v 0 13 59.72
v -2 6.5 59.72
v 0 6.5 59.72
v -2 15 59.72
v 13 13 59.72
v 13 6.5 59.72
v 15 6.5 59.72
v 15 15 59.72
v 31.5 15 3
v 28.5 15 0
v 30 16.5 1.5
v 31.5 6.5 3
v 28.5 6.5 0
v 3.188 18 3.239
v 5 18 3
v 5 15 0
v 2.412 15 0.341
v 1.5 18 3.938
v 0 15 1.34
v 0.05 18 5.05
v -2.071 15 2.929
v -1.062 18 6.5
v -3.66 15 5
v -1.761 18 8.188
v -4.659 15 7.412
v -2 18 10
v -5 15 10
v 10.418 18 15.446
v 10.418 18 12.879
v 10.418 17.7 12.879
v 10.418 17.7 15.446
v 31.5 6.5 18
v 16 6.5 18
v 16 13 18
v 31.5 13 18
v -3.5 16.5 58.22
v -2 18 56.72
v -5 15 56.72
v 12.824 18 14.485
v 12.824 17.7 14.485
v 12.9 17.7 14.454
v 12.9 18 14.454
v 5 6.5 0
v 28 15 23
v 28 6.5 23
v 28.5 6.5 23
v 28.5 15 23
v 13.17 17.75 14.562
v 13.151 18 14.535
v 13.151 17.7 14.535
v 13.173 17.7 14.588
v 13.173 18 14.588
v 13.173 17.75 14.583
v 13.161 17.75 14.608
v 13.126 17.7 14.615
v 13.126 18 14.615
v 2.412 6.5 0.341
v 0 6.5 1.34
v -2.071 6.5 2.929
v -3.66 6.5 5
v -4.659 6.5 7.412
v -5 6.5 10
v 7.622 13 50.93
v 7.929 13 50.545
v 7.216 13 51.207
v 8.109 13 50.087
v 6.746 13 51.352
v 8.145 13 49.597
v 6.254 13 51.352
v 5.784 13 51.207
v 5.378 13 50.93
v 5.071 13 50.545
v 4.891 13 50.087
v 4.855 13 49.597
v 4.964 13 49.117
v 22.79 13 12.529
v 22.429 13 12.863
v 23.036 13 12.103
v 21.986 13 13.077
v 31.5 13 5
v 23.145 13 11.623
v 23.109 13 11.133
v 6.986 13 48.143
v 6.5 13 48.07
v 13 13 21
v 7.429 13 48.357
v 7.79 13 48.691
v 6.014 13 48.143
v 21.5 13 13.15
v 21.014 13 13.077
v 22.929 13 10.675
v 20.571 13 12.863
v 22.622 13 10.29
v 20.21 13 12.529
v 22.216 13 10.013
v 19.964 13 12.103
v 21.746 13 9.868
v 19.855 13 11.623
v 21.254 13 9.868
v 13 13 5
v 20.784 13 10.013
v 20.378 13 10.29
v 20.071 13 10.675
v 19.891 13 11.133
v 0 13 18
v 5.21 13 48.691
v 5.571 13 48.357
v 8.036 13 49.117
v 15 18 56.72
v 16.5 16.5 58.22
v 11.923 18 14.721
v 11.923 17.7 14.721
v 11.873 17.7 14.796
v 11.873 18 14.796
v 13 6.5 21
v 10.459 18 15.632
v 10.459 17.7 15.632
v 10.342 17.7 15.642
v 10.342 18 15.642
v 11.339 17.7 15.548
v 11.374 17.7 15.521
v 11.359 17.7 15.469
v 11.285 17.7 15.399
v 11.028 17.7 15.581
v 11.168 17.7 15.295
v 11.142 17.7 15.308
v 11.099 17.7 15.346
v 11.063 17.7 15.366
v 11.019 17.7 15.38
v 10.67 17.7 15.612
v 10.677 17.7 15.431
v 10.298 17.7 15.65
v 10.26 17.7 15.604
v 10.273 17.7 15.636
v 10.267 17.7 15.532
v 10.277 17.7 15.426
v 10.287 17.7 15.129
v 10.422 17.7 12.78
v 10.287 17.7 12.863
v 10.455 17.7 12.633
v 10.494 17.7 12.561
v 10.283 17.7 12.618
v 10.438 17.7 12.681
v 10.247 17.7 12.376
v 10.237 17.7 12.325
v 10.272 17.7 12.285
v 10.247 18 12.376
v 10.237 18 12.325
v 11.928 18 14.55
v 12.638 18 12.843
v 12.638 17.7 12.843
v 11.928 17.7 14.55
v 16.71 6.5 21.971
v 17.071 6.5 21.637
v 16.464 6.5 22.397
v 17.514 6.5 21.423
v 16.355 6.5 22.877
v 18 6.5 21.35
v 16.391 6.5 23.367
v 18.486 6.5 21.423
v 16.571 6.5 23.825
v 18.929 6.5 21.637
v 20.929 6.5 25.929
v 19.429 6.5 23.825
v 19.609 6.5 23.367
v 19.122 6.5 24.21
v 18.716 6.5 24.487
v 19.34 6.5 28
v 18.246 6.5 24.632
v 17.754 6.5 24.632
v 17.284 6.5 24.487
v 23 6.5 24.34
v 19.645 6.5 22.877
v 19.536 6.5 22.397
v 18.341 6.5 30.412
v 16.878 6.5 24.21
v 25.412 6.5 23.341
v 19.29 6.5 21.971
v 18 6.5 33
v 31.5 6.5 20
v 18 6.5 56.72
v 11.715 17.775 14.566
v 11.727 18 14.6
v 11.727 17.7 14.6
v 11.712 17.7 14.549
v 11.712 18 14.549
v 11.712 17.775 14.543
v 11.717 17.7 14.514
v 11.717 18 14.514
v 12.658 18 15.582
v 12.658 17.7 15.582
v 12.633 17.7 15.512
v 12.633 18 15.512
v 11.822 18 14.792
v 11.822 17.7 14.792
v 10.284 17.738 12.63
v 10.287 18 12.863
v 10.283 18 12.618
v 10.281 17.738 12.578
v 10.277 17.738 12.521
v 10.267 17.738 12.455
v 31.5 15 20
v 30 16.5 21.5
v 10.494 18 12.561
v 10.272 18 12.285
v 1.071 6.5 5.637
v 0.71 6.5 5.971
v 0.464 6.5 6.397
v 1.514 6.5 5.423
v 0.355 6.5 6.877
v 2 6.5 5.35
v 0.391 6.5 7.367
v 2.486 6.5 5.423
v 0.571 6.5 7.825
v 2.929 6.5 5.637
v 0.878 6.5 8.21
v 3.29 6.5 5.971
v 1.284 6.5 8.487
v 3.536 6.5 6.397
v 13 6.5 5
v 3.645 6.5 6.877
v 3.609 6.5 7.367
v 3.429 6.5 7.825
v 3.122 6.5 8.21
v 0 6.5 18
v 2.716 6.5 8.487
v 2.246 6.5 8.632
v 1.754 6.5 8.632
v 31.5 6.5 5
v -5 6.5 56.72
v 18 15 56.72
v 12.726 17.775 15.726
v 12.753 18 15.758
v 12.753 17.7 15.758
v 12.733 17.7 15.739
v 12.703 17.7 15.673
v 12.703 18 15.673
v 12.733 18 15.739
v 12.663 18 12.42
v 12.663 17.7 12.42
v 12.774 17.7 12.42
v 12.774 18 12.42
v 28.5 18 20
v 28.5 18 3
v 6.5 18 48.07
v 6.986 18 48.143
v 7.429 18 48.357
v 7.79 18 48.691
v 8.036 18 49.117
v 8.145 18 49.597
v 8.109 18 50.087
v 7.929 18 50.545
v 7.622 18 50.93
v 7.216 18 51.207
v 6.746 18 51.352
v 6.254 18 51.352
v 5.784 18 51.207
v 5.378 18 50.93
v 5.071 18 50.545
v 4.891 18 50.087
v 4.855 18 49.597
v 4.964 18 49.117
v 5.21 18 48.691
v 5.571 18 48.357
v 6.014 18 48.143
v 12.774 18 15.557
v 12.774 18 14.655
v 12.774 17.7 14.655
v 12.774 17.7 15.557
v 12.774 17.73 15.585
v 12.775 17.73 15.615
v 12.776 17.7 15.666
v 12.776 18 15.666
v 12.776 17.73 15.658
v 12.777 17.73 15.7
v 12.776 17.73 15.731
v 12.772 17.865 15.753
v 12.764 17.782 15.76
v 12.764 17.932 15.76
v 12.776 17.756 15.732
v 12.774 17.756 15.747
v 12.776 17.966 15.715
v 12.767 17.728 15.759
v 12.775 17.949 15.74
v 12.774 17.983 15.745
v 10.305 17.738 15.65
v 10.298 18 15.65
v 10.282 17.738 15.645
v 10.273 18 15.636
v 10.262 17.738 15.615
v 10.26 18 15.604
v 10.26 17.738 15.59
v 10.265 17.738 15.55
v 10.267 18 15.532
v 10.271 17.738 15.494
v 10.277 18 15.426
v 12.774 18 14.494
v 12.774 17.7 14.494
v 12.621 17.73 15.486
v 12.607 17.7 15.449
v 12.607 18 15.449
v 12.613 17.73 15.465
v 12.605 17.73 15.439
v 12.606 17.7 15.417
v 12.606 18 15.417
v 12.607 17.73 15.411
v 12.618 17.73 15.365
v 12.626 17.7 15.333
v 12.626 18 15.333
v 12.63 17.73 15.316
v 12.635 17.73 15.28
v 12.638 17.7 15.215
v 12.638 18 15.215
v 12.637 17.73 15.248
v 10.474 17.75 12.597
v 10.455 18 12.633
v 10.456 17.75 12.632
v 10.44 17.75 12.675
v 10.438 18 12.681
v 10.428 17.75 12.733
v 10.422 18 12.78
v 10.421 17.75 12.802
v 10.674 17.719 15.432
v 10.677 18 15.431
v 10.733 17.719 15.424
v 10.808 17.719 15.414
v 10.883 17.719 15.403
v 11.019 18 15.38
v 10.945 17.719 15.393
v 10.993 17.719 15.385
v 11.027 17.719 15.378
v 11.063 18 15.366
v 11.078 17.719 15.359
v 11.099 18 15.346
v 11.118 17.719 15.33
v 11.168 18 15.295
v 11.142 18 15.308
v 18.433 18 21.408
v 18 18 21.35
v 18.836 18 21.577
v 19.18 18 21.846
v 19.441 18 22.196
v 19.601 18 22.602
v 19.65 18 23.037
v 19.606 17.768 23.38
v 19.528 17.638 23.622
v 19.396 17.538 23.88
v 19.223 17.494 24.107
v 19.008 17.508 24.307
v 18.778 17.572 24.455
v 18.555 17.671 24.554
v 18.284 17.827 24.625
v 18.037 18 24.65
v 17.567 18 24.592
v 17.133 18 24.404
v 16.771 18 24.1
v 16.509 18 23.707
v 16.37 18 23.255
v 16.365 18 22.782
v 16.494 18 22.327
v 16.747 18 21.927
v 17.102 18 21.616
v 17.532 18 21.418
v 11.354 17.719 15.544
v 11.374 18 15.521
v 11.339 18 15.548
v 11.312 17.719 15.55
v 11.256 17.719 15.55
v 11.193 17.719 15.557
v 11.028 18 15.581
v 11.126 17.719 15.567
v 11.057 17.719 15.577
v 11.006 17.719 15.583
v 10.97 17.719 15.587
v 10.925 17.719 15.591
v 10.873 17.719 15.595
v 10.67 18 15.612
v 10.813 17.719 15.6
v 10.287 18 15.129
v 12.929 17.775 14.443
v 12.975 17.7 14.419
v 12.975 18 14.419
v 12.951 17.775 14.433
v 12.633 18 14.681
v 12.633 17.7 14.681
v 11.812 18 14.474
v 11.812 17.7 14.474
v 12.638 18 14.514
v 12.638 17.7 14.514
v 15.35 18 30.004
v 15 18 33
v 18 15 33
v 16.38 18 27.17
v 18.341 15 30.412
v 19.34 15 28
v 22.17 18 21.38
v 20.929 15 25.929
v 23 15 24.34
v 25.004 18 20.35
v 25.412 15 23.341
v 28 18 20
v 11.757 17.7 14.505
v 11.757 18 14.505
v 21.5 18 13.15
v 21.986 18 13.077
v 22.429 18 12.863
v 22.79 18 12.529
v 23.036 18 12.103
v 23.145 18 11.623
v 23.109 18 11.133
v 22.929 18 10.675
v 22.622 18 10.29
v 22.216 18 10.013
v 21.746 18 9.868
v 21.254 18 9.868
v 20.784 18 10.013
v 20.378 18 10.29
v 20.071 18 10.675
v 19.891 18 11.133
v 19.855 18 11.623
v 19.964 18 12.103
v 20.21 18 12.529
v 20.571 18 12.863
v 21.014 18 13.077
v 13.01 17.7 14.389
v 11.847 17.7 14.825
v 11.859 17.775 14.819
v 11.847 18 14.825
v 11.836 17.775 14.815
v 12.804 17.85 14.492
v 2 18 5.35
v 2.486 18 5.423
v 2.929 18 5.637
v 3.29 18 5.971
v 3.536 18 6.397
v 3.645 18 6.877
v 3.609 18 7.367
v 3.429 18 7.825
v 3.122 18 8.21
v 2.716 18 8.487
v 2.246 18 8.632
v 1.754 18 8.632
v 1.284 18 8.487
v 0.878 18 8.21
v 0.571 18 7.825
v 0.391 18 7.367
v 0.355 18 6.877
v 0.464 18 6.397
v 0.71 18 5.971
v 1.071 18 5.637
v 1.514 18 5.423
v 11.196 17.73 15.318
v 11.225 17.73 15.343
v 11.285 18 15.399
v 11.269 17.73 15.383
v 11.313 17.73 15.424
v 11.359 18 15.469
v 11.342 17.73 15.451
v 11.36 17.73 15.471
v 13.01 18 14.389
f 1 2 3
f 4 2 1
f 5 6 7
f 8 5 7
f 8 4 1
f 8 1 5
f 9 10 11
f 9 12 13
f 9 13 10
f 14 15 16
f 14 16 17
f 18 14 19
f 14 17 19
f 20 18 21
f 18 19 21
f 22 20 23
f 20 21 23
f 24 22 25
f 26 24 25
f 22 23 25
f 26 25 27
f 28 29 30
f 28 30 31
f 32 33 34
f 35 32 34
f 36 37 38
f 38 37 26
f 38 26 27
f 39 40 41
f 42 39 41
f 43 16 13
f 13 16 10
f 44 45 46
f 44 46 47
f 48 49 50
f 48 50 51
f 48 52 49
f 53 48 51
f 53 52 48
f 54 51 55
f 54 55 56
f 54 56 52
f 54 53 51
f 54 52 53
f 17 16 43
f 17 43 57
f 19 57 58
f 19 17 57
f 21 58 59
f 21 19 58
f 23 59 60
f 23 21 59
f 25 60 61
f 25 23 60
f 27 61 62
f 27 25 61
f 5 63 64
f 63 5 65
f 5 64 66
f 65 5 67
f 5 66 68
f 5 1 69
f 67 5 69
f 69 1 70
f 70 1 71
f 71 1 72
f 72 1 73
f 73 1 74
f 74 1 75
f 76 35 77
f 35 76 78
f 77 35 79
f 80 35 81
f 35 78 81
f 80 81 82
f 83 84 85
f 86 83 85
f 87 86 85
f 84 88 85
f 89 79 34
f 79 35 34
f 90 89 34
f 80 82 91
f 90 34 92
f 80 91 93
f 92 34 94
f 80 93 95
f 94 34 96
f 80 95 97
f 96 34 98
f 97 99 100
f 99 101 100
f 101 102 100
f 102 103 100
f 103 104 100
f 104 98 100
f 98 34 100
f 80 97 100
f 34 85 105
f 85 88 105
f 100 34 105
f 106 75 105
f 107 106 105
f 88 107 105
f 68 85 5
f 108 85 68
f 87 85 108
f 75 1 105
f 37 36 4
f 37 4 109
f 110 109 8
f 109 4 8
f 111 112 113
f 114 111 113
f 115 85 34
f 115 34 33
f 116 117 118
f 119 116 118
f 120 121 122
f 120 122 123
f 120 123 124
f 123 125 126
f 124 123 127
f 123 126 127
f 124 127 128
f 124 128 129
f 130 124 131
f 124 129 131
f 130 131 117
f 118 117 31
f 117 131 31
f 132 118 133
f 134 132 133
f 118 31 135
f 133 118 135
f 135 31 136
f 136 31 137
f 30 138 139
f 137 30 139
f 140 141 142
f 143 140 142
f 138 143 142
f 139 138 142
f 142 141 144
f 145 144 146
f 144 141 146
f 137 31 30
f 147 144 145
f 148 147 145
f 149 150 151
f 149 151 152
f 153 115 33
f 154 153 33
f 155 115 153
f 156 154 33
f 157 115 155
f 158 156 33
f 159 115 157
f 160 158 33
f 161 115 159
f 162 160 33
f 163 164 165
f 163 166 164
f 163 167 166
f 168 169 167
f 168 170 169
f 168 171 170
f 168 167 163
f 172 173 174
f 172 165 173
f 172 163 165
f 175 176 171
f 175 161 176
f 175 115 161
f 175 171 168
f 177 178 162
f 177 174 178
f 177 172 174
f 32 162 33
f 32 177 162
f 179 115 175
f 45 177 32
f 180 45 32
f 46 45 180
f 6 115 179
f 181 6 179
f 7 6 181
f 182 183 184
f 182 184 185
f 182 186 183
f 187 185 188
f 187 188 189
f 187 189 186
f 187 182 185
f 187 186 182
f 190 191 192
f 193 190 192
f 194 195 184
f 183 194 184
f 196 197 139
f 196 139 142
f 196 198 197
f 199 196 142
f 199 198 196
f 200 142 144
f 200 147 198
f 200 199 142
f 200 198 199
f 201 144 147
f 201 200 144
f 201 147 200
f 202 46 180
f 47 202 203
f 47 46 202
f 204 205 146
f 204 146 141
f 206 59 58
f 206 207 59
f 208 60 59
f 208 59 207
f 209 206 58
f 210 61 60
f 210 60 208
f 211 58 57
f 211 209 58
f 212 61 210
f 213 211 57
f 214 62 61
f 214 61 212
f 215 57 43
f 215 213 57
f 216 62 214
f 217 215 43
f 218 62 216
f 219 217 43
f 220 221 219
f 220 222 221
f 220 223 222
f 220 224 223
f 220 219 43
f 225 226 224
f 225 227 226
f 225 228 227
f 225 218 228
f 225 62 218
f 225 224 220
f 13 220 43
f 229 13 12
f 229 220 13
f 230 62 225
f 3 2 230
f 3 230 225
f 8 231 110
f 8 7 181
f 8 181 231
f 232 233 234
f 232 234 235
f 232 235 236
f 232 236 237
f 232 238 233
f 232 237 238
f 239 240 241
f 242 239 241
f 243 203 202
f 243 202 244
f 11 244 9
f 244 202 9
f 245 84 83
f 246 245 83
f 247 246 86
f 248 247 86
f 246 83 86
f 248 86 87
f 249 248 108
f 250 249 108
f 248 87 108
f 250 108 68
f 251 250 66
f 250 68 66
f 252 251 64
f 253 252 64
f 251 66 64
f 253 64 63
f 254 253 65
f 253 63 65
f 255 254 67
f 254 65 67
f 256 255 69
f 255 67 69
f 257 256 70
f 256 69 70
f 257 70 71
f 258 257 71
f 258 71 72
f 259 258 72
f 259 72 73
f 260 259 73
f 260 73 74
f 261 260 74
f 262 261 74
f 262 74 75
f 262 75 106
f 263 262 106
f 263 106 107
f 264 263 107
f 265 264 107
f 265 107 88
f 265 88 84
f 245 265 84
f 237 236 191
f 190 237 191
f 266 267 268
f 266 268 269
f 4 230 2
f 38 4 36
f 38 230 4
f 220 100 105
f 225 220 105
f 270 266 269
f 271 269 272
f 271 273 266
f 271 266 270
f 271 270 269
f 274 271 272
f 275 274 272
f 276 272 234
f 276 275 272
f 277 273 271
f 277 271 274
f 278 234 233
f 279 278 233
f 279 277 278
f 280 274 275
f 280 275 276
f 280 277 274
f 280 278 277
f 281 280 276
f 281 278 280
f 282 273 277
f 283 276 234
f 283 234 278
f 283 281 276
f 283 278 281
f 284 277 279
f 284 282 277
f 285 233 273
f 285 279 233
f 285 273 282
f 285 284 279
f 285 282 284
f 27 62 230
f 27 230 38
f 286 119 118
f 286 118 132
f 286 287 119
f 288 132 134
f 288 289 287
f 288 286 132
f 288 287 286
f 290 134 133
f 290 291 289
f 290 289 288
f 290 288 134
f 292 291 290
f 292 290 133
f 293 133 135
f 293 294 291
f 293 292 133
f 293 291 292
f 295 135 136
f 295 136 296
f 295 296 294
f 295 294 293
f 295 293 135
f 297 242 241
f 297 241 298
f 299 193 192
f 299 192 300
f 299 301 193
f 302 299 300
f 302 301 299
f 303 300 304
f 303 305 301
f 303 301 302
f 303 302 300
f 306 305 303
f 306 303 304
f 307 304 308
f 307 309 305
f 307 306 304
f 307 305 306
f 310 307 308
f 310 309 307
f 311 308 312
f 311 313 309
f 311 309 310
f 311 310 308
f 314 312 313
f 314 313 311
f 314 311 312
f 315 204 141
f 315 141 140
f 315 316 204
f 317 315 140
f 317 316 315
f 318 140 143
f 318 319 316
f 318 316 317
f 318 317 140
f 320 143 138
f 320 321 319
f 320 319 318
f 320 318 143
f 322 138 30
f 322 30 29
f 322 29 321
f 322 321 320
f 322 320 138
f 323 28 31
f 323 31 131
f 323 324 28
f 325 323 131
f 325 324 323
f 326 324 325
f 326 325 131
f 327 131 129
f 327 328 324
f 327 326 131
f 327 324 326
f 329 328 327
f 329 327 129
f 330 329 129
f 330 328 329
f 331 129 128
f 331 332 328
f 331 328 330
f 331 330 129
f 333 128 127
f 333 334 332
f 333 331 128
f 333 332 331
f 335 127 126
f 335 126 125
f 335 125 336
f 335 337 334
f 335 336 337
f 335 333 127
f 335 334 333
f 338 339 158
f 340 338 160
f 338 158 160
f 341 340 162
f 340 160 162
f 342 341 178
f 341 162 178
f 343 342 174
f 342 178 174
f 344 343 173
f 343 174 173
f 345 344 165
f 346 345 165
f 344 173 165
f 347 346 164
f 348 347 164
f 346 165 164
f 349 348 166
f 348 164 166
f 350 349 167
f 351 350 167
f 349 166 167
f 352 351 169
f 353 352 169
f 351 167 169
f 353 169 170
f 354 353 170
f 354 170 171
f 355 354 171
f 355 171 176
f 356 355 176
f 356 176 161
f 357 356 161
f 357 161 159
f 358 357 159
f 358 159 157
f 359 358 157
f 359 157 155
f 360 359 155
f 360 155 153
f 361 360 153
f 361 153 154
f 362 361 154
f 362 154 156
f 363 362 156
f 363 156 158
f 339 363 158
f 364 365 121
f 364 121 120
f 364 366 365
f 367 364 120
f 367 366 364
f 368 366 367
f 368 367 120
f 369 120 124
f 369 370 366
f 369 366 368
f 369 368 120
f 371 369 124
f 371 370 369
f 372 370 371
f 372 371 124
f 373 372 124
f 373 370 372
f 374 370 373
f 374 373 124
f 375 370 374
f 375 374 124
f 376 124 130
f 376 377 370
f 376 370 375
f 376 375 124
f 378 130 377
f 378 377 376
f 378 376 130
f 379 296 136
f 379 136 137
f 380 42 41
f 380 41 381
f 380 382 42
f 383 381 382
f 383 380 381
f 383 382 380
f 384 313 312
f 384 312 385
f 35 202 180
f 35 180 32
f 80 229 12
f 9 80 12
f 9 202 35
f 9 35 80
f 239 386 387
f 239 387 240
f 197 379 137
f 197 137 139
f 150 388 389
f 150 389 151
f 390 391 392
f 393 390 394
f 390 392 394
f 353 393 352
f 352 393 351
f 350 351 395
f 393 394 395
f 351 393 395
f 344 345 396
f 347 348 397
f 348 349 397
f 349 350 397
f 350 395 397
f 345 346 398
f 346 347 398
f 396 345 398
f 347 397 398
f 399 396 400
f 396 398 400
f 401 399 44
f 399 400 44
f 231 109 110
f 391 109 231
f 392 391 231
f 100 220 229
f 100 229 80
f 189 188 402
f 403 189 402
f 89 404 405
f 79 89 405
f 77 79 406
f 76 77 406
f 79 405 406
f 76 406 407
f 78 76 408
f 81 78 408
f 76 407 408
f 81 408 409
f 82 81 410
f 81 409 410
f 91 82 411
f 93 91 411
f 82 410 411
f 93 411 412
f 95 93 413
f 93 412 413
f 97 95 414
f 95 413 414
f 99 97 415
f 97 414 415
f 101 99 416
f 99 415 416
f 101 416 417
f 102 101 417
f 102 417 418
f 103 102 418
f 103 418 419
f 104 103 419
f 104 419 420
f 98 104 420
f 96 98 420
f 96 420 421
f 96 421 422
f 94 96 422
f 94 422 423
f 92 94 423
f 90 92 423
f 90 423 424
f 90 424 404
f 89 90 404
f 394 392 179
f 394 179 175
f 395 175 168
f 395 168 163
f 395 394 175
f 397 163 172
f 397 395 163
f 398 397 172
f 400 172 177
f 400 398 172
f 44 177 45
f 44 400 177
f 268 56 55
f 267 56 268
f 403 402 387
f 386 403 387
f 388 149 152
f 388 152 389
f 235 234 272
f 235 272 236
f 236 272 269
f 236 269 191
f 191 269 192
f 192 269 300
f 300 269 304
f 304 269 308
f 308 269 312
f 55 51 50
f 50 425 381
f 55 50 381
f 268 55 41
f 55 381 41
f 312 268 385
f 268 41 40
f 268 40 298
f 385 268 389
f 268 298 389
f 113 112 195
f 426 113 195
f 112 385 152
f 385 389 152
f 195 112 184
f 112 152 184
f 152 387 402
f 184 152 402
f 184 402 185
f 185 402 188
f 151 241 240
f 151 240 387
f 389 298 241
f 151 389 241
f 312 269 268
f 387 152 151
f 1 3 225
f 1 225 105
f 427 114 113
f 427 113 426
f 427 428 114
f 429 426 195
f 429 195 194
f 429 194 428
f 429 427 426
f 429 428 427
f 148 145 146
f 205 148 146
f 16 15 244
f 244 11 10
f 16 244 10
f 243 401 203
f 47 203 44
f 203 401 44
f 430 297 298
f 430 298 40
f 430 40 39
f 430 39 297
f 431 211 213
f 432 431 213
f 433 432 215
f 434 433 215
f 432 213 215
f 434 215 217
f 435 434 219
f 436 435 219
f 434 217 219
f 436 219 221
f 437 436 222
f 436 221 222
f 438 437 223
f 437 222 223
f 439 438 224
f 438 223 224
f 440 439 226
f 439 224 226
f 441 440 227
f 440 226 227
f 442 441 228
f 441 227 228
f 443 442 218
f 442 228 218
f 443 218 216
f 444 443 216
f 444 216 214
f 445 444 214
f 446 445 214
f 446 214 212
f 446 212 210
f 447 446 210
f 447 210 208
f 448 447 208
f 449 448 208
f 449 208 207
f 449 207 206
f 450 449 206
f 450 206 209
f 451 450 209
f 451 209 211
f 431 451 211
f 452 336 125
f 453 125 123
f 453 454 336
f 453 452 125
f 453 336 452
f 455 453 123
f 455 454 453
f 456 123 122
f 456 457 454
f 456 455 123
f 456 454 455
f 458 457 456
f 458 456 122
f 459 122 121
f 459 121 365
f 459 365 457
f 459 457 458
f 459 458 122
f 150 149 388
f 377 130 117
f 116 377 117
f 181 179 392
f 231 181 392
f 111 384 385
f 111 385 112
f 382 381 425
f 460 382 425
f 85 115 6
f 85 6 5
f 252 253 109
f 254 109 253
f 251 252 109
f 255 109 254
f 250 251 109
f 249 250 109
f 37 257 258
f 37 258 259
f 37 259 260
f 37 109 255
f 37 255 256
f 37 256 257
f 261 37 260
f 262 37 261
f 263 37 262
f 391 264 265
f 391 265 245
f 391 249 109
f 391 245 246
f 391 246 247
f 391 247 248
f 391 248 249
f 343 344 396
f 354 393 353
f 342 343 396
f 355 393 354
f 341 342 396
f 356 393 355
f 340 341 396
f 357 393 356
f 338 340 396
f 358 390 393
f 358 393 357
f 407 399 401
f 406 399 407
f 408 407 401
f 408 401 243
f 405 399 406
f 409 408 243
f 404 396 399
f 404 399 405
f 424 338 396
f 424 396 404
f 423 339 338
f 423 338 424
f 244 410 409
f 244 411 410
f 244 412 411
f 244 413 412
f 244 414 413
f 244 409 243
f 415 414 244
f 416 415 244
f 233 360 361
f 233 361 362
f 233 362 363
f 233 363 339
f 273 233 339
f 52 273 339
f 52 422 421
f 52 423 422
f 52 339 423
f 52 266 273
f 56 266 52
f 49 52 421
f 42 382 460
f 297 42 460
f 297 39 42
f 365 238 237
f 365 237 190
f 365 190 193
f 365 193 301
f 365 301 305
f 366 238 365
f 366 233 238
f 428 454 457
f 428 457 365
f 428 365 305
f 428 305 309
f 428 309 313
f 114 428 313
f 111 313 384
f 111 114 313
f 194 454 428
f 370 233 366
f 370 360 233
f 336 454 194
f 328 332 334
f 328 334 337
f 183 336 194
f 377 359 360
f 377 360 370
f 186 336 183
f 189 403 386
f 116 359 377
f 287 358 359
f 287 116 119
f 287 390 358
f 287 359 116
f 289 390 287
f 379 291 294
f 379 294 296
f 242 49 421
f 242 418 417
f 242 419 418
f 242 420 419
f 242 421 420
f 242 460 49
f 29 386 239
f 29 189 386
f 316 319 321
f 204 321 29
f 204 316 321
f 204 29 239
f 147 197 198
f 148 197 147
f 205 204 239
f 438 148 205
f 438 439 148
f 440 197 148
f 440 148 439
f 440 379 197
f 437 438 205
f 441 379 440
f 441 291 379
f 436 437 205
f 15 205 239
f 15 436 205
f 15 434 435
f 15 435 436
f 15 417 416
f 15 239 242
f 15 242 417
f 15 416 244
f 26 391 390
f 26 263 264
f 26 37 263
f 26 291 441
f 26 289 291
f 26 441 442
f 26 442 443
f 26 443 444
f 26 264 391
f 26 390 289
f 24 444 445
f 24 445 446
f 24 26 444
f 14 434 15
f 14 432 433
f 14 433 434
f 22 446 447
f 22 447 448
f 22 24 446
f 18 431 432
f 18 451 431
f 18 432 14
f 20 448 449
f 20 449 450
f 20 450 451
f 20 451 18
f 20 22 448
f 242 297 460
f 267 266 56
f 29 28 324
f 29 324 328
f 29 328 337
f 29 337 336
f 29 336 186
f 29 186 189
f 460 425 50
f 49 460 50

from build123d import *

# Parameters (mm, degrees)
SKETCH_1_W          = 23
SKETCH_1_H          = 23
SKETCH_1_W_2        = 13
SKETCH_1_H_2        = 13
EXTRUDE_1_DEPTH     = 59.72
SKETCH_2_R          = 1.65
CUT_EXTRUDE_1_DEPTH = 34
SKETCH_4_W          = 23
SKETCH_4_H          = 23
SKETCH_4_R          = 3
EXTRUDE_2_DEPTH     = 3.5
SKETCH_5_W          = 23
SKETCH_5_H          = 23
SKETCH_5_W_2        = 13
SKETCH_5_H_2        = 13
EXTRUDE_1_2_DEPTH   = 10
SKETCH_6_R          = 1.65
CUT_EXTRUDE_2_DEPTH = 39
SKETCH_7_W          = 13
SKETCH_7_H          = 13
CUT_EXTRUDE_3_DEPTH = 13
CHAMFER_1_SIZE      = 3
SKETCH_8_W          = 36.5
SKETCH_8_H          = 59.72
CUT_EXTRUDE_4_DEPTH = 11.5
EXTRUDE_3_DEPTH     = 6.5
FILLET_1_R          = 10
FILLET_2_R          = 10
SKETCH_10_R         = 1.65
CUT_EXTRUDE_5_DEPTH = 28.5
CHAMFER_3_SIZE      = 3
CHAMFER_4_SIZE      = 3
CHAMFER_5_SIZE      = 3
CUT_EXTRUDE_6_DEPTH = 0.3


with BuildPart() as part:
    # 草图1 → Extrude 1 (new body)
    with BuildSketch(Plane.XY):
        with Locations((6.5, 6.5)):
            Rectangle(SKETCH_1_W, SKETCH_1_H)
        with Locations((6.5, 6.5)):
            Rectangle(SKETCH_1_W_2, SKETCH_1_H_2, mode=Mode.SUBTRACT)
    extrude(amount=EXTRUDE_1_DEPTH)

    # 草图2 → 切除-拉伸1 (cut)
    with BuildSketch(Plane.XZ.offset(5)):
        with Locations(Location((6.5, 49.72, 0), (0, 0, 270))):
            Circle(SKETCH_2_R)
    extrude(amount=-CUT_EXTRUDE_1_DEPTH, mode=Mode.SUBTRACT)

    # 草图4 → 凸台-拉伸2 (add)
    with BuildSketch(Plane(origin=(18, 0, 0), x_dir=(0, 0, -1), z_dir=(1, 0, 0))):
        with Locations((-11.5, 6.5)):
            Rectangle(SKETCH_4_W, SKETCH_4_H)
        with Locations(Location((-11.5, 6.5, 0), (0, 0, 90))):
            Circle(SKETCH_4_R, mode=Mode.SUBTRACT)
    extrude(amount=EXTRUDE_2_DEPTH)

    # 草图5 → Extrude 1 2 (add)
    with BuildSketch(Plane(origin=(21.5, 0, 0), x_dir=(0, 0, -1), z_dir=(1, 0, 0))):
        with Locations((-11.5, 6.5)):
            Rectangle(SKETCH_5_W, SKETCH_5_H)
        with Locations((-11.5, 6.5)):
            Rectangle(SKETCH_5_W_2, SKETCH_5_H_2, mode=Mode.SUBTRACT)
    extrude(amount=EXTRUDE_1_2_DEPTH)

    # 草图6 → 切除-拉伸2 (cut)
    with BuildSketch(Plane(origin=(0, 18, 0), x_dir=(1, 0, 0), z_dir=(0, 1, 0))):
        with Locations(Location((21.5, -11.5, 0), (0, 0, 270))):
            Circle(SKETCH_6_R)
    extrude(amount=-CUT_EXTRUDE_2_DEPTH, mode=Mode.SUBTRACT)

    # 草图7 → 切除-拉伸3 (cut)
    with BuildSketch(Plane(origin=(21.5, 0, 0), x_dir=(0, 0, -1), z_dir=(1, 0, 0))):
        with Locations((-11.5, 6.5)):
            Rectangle(SKETCH_7_W, SKETCH_7_H)
    extrude(amount=-CUT_EXTRUDE_3_DEPTH, mode=Mode.SUBTRACT)

    # 倒角1
    chamfer_1_edges = [part.edges().sort_by_distance(p)[0] for p in [
        (13, 6.5, 18),
    ]]
    chamfer(chamfer_1_edges, length=CHAMFER_1_SIZE)

    # 草图8 → 切除-拉伸4 (cut)
    with BuildSketch(Plane.XZ.offset(5)):
        with Locations((13.25, 29.86)):
            Rectangle(SKETCH_8_W, SKETCH_8_H)
    extrude(amount=-CUT_EXTRUDE_4_DEPTH, mode=Mode.SUBTRACT)

    # 草图9 → 凸台-拉伸3 (add)
    with BuildSketch(Plane.XZ.offset(-13)):
        Polygon((13, 5), (0, 18), (0, 0), (13, 0), align=None)
    extrude(amount=EXTRUDE_3_DEPTH)

    # 圆角1
    fillet_1_edges = [part.edges().sort_by_distance(p)[0] for p in [
        (-5, 12.25, 0),
    ]]
    fillet(fillet_1_edges, radius=FILLET_1_R)

    # 圆角2
    fillet_2_edges = [part.edges().sort_by_distance(p)[0] for p in [
        (18, 12.25, 23),
    ]]
    fillet(fillet_2_edges, radius=FILLET_2_R)

    # 草图10 → 切除-拉伸5 (cut)
    with BuildSketch(Plane.XZ.offset(-6.5)):
        with Locations(Location((2, 7, 0), (0, 0, 270))):
            Circle(SKETCH_10_R)
        with Locations(Location((18, 23, 0), (0, 0, 270))):
            Circle(SKETCH_10_R)
    extrude(amount=-CUT_EXTRUDE_5_DEPTH, mode=Mode.SUBTRACT)

    # 倒角3
    # the kernel refuses this chamfer: 3 mm, written as the material it takes off along each edge
    with BuildSketch(Plane(origin=(5, 18, 10), x_dir=(0, 0, -1), z_dir=(1, 0, 0))) as chamfer_3_piece_1:
        Polygon((10 - CHAMFER_3_SIZE, 0), (10, -CHAMFER_3_SIZE), (10, 0), align=None)
    revolve(axis=Axis((5, 18, 10), (0, 1, 0)), revolution_arc=90, mode=Mode.SUBTRACT)
    with BuildSketch(Plane(origin=(28, 18, 33), x_dir=(-1, 0, 0), z_dir=(0, 0, 1))) as chamfer_3_piece_2:
        Polygon((10 + CHAMFER_3_SIZE, 0), (10, CHAMFER_3_SIZE), (10, 0), align=None)
    revolve(axis=Axis((28, 18, 33), (0, -1, 0)), revolution_arc=90, mode=Mode.SUBTRACT)
    with BuildSketch(Plane(origin=(28, 18, 23), x_dir=(0, 0.027495876610586768, -0.9996219169112968), z_dir=(1, 0, 0))) as chamfer_3_piece_3:
        Polygon((CHAMFER_3_SIZE * 0.999621916911, -CHAMFER_3_SIZE * 0.0274958766106), (-CHAMFER_3_SIZE * 0.0274958766106, -CHAMFER_3_SIZE * 0.999621916911), (0, 0), align=None)
    extrude(amount=11.215048964, mode=Mode.SUBTRACT)
    with BuildSketch(Plane(origin=(39.215048964, 18, 0), x_dir=(0, 0.027495876610586778, 0.9996219169112968), z_dir=(-1, 0, 0))) as chamfer_3_piece_4:
        Polygon((CHAMFER_3_SIZE * 0.999621916911, -CHAMFER_3_SIZE * 0.0274958766106), (-CHAMFER_3_SIZE * 0.0274958766106, -CHAMFER_3_SIZE * 0.999621916911), (0, 0), align=None)
    extrude(amount=34.215048964, mode=Mode.SUBTRACT)
    with BuildSketch(Plane(origin=(-5, 18, 10), x_dir=(0.9996219169112968, 0.027495876610586778, 0), z_dir=(0, 0, 1))) as chamfer_3_piece_5:
        Polygon((CHAMFER_3_SIZE * 0.999621916911, -CHAMFER_3_SIZE * 0.0274958766106), (-CHAMFER_3_SIZE * 0.0274958766106, -CHAMFER_3_SIZE * 0.999621916911), (0, 0), align=None)
    extrude(amount=57.435048964, mode=Mode.SUBTRACT)
    with BuildSketch(Plane(origin=(18, 18, 33), x_dir=(-0.9996219169112968, 0.02749587661058678, 0), z_dir=(0, 0, 1))) as chamfer_3_piece_6:
        Polygon((CHAMFER_3_SIZE * 0.999621916911, CHAMFER_3_SIZE * 0.0274958766106), (-CHAMFER_3_SIZE * 0.0274958766106, CHAMFER_3_SIZE * 0.999621916911), (0, 0), align=None)
    extrude(amount=34.435048964, mode=Mode.SUBTRACT)

    # 倒角4
    chamfer_4_edges = [part.edges().sort_by_distance(p)[0] for p in [
        (31.5, 18, 11.5),
        (6.5, 18, 59.72),
    ]]
    chamfer(chamfer_4_edges, length=CHAMFER_4_SIZE)

    # 倒角5
    chamfer_5_edges = [part.edges().sort_by_distance(p)[0] for p in [
        (31.5, 10.75, 0),
        (18, 10.75, 59.72),
        (-5, 10.75, 59.72),
        (31.5, 10.75, 23),
    ]]
    chamfer(chamfer_5_edges, length=CHAMFER_5_SIZE)

    # 草图11 → 切除-拉伸6 (cut)
    # profile 1 of 2: a face of its own
    with BuildSketch(Plane(origin=(0, 18, 0), x_dir=(1, 0, 0), z_dir=(0, 1, 0))):
        with BuildLine():
            Line((10.237159209, -12.32483908), (10.272211414, -12.284566333))
            Line((10.272211414, -12.284566333), (10.493711521, -12.561255018))
            add(Edge.make_bspline(
                [(10.493711521, -12.561255018), (10.487309741, -12.57321708), (10.474664974, -12.596844492), (10.453766643, -12.633245036), (10.437383484, -12.678803736), (10.42678589, -12.736107023), (10.41929345, -12.804438747), (10.418698455, -12.853332822), (10.418386569, -12.878962242)],
                knots=[0, 0, 0, 0, 0.736410598, 1.454555069, 2.274010016, 3.348139226, 4.609940921, 6, 6, 6, 6], degree=3))
            Line((10.418386569, -12.878962242), (10.418386569, -15.445976945))
            add(Edge.make_bspline(
                [(10.418386569, -15.445976945), (10.439024116, -15.446197463), (10.476825383, -15.44660138), (10.527504836, -15.444164634), (10.567096144, -15.444382267), (10.599440912, -15.441684851), (10.633925707, -15.437068289), (10.678646108, -15.43114223), (10.738403056, -15.423897132), (10.807978822, -15.413933144), (10.878573878, -15.403442161), (10.940268165, -15.393999697), (10.988224608, -15.385574298), (11.03333546, -15.377768735), (11.077634294, -15.362395951), (11.116507962, -15.334038018), (11.141501488, -15.3052678), (11.160956228, -15.297943801), (11.167907131, -15.29532704)],
                knots=[0, 0, 0, 0, 1.271684107, 2.329311289, 3.126176351, 3.710204741, 4.32783396, 5.270448411, 6.49050515, 8.03759688, 9.602040843, 10.889228832, 11.884182716, 12.602334394, 13.712376462, 14.732953672, 15.547302315, 16, 16, 16, 16], degree=3))
            add(Edge.make_bspline(
                [(11.167907131, -15.29532704), (11.171157256, -15.297790165), (11.180598208, -15.304945044), (11.199465358, -15.321199607), (11.23074612, -15.346977294), (11.268675777, -15.383728766), (11.307606698, -15.419746285), (11.338574425, -15.448367363), (11.360816593, -15.468783286), (11.369429212, -15.489923279), (11.373022107, -15.507004685), (11.374056065, -15.517065759), (11.374491406, -15.521301897)],
                knots=[0, 0, 0, 0, 0.390394386, 1.134016561, 2.38360509, 4.269889804, 6.18981564, 7.453157385, 8.329021544, 9.032311711, 9.592562279, 10, 10, 10, 10], degree=3))
            add(Edge.make_bspline(
                [(11.374491406, -15.521301897), (11.37240974, -15.526097769), (11.368224433, -15.535740147), (11.353436868, -15.545092844), (11.334328563, -15.550059783), (11.301085761, -15.549499), (11.253456452, -15.547924897), (11.1916752, -15.557511576), (11.12536294, -15.566709384), (11.072725012, -15.574940209), (11.032733497, -15.580748142), (11.003569508, -15.583319798), (10.966840315, -15.587442615), (10.922278163, -15.590745604), (10.870087153, -15.595374751), (10.810170985, -15.600549317), (10.742588839, -15.606698877), (10.694831886, -15.610362116), (10.669718339, -15.612288472)],
                knots=[0, 0, 0, 0, 0.341365878, 0.68633572, 1.116730632, 1.647491765, 2.890856209, 4.29325764, 5.800779701, 7.359923239, 7.845242571, 8.495183841, 9.311733456, 10.309872826, 11.474601469, 12.805924266, 14.320358265, 16, 16, 16, 16], degree=3))
            Line((10.669718339, -15.612288472), (10.458659315, -15.632424846))
            Line((10.458659315, -15.632424846), (10.342315825, -15.642120137))
            add(Edge.make_bspline(
                [(10.342315825, -15.642120137), (10.330205012, -15.646066226), (10.310576231, -15.652461909), (10.28162952, -15.648341606), (10.269064193, -15.631583459), (10.259329157, -15.613202207), (10.260064065, -15.584545017), (10.265458776, -15.544786876), (10.272435293, -15.490061402), (10.275652028, -15.448717521), (10.277431955, -15.425840571)],
                knots=[0, 0, 0, 0, 1.058270145, 1.715207142, 2.242218181, 2.723015089, 3.427046488, 4.550153686, 6.091084828, 8, 8, 8, 8], degree=3))
            Line((10.277431955, -15.425840571), (10.287127246, -15.129015513))
            Line((10.287127246, -15.129015513), (10.287127246, -12.863300618))
            add(Edge.make_bspline(
                [(10.287127246, -12.863300618), (10.287232845, -12.835208092), (10.287422554, -12.784739607), (10.286319057, -12.717874585), (10.286118094, -12.668130177), (10.283854663, -12.623640485), (10.281146263, -12.576386479), (10.277055063, -12.517791845), (10.267701437, -12.449509467), (10.254241067, -12.401757484), (10.2468545, -12.375552909)],
                knots=[0, 0, 0, 0, 1.372323329, 2.465391677, 3.267017655, 3.801925377, 4.641299591, 5.579257235, 6.671583216, 8, 8, 8, 8], degree=3))
            Line((10.2468545, -12.375552909), (10.237159209, -12.32483908))
        make_face()
    # profile 2 of 2: a face of its own
    with BuildSketch(Plane(origin=(0, 18, 0), x_dir=(1, 0, 0), z_dir=(0, 1, 0))):
        with BuildLine():
            Line((12.632641842, -14.680794758), (11.922648235, -14.721067505))
            Line((11.922648235, -14.721067505), (11.872680197, -14.796392457))
            add(Edge.make_bspline(
                [(11.872680197, -14.796392457), (11.8694195, -14.804285956), (11.864491576, -14.816215479), (11.846271787, -14.82851828), (11.832603325, -14.810870961), (11.826144402, -14.799362255), (11.821966368, -14.791917707)],
                knots=[0, 0, 0, 0, 1.282902353, 1.938863145, 2.666728425, 4, 4, 4, 4], degree=3))
            Line((11.821966368, -14.791917707), (11.726505043, -14.600249265))
            add(Edge.make_bspline(
                [(11.726505043, -14.600249265), (11.722421253, -14.588930913), (11.715687127, -14.570267068), (11.710784433, -14.54521565), (11.712178398, -14.527547303), (11.71541385, -14.518420775), (11.716809752, -14.514483231)],
                knots=[0, 0, 0, 0, 1.63130738, 2.690008936, 3.434818089, 4, 4, 4, 4], degree=3))
            Line((11.716809752, -14.514483231), (11.757082499, -14.50478794))
            Line((11.757082499, -14.50478794), (11.812271077, -14.474210484))
            Line((11.812271077, -14.474210484), (12.663219298, -12.420300405))
            Line((12.663219298, -12.420300405), (12.773596456, -12.420300405))
            Line((12.773596456, -12.420300405), (12.773596456, -14.494346857))
            add(Edge.make_bspline(
                [(12.773596456, -14.494346857), (12.783968002, -14.49442549), (12.801603574, -14.494559195), (12.817685995, -14.487541945), (12.824310285, -14.484651566)],
                knots=[0, 0, 0, 0, 1.176207474, 2, 2, 2, 2], degree=3))
            Line((12.824310285, -14.484651566), (12.899635237, -14.454074111))
            add(Edge.make_bspline(
                [(12.899635237, -14.454074111), (12.909372882, -14.45043977), (12.926729924, -14.443961672), (12.949079362, -14.434232754), (12.964900623, -14.426741929), (12.972272578, -14.421084462), (12.974960189, -14.419021905)],
                knots=[0, 0, 0, 0, 1.495147538, 2.665053038, 3.513315187, 4, 4, 4, 4], degree=3))
            Line((12.974960189, -14.419021905), (13.010012394, -14.389190241))
            Line((13.010012394, -14.389190241), (13.150967008, -14.534619604))
            add(Edge.make_bspline(
                [(13.150967008, -14.534619604), (13.158147754, -14.543261129), (13.169902345, -14.557406954), (13.175032726, -14.581345927), (13.170140153, -14.59753514), (13.16099412, -14.609193669), (13.145051649, -14.61408062), (13.133316768, -14.61476132), (13.126355885, -14.615165097)],
                knots=[0, 0, 0, 0, 1.690587597, 2.767423091, 3.557953073, 4.202677464, 4.933866242, 6, 6, 6, 6], degree=3))
            Line((13.126355885, -14.615165097), (12.773596456, -14.655437844))
            Line((12.773596456, -14.655437844), (12.773596456, -15.557099894))
            add(Edge.make_bspline(
                [(12.773596456, -15.557099894), (12.773578503, -15.559834814), (12.773518084, -15.569038872), (12.77467652, -15.588414589), (12.77514626, -15.619244646), (12.775750734, -15.657554868), (12.776785958, -15.695996276), (12.77645149, -15.727131786), (12.77443333, -15.746766153), (12.769686653, -15.759384491), (12.760395185, -15.761643892), (12.755626049, -15.759456885), (12.753460082, -15.758463627)],
                knots=[0, 0, 0, 0, 0.375701713, 1.264380521, 2.665139726, 4.612257271, 6.525225464, 7.960129458, 8.858599367, 9.286556546, 9.675980055, 10, 10, 10, 10], degree=3))
            add(Edge.make_bspline(
                [(12.753460082, -15.758463627), (12.749249226, -15.755960749), (12.736555449, -15.748415734), (12.725430289, -15.724067152), (12.712062685, -15.69879476), (12.706053313, -15.680496526), (12.703492045, -15.672697592)],
                knots=[0, 0, 0, 0, 0.572299195, 1.725216547, 3.030459198, 4, 4, 4, 4], degree=3))
            Line((12.703492045, -15.672697592), (12.657998757, -15.581711017))
            Line((12.657998757, -15.581711017), (12.632641842, -15.511606606))
            add(Edge.make_bspline(
                [(12.632641842, -15.511606606), (12.628785774, -15.503205626), (12.621808143, -15.488003888), (12.614164578, -15.467049314), (12.607340053, -15.451579242), (12.603541019, -15.433174575), (12.6079974, -15.404423208), (12.617819006, -15.364159555), (12.629614236, -15.321116662), (12.635156078, -15.28178508), (12.63743117, -15.247878072), (12.637716587, -15.22597172), (12.637862384, -15.214781547)],
                knots=[0, 0, 0, 0, 0.908031708, 1.643101311, 2.192199313, 2.565975908, 3.473020803, 5.002279505, 6.661670863, 7.846934984, 8.900174221, 10, 10, 10, 10], degree=3))
            Line((12.637862384, -15.214781547), (12.632641842, -14.680794758))
        make_face()
        Polygon((12.637862384, -14.514483231), (12.637862384, -12.843164245), (11.927868776, -14.550281228), align=None, mode=Mode.SUBTRACT)
    extrude(amount=-CUT_EXTRUDE_6_DEPTH, mode=Mode.SUBTRACT)


solid = part.part
